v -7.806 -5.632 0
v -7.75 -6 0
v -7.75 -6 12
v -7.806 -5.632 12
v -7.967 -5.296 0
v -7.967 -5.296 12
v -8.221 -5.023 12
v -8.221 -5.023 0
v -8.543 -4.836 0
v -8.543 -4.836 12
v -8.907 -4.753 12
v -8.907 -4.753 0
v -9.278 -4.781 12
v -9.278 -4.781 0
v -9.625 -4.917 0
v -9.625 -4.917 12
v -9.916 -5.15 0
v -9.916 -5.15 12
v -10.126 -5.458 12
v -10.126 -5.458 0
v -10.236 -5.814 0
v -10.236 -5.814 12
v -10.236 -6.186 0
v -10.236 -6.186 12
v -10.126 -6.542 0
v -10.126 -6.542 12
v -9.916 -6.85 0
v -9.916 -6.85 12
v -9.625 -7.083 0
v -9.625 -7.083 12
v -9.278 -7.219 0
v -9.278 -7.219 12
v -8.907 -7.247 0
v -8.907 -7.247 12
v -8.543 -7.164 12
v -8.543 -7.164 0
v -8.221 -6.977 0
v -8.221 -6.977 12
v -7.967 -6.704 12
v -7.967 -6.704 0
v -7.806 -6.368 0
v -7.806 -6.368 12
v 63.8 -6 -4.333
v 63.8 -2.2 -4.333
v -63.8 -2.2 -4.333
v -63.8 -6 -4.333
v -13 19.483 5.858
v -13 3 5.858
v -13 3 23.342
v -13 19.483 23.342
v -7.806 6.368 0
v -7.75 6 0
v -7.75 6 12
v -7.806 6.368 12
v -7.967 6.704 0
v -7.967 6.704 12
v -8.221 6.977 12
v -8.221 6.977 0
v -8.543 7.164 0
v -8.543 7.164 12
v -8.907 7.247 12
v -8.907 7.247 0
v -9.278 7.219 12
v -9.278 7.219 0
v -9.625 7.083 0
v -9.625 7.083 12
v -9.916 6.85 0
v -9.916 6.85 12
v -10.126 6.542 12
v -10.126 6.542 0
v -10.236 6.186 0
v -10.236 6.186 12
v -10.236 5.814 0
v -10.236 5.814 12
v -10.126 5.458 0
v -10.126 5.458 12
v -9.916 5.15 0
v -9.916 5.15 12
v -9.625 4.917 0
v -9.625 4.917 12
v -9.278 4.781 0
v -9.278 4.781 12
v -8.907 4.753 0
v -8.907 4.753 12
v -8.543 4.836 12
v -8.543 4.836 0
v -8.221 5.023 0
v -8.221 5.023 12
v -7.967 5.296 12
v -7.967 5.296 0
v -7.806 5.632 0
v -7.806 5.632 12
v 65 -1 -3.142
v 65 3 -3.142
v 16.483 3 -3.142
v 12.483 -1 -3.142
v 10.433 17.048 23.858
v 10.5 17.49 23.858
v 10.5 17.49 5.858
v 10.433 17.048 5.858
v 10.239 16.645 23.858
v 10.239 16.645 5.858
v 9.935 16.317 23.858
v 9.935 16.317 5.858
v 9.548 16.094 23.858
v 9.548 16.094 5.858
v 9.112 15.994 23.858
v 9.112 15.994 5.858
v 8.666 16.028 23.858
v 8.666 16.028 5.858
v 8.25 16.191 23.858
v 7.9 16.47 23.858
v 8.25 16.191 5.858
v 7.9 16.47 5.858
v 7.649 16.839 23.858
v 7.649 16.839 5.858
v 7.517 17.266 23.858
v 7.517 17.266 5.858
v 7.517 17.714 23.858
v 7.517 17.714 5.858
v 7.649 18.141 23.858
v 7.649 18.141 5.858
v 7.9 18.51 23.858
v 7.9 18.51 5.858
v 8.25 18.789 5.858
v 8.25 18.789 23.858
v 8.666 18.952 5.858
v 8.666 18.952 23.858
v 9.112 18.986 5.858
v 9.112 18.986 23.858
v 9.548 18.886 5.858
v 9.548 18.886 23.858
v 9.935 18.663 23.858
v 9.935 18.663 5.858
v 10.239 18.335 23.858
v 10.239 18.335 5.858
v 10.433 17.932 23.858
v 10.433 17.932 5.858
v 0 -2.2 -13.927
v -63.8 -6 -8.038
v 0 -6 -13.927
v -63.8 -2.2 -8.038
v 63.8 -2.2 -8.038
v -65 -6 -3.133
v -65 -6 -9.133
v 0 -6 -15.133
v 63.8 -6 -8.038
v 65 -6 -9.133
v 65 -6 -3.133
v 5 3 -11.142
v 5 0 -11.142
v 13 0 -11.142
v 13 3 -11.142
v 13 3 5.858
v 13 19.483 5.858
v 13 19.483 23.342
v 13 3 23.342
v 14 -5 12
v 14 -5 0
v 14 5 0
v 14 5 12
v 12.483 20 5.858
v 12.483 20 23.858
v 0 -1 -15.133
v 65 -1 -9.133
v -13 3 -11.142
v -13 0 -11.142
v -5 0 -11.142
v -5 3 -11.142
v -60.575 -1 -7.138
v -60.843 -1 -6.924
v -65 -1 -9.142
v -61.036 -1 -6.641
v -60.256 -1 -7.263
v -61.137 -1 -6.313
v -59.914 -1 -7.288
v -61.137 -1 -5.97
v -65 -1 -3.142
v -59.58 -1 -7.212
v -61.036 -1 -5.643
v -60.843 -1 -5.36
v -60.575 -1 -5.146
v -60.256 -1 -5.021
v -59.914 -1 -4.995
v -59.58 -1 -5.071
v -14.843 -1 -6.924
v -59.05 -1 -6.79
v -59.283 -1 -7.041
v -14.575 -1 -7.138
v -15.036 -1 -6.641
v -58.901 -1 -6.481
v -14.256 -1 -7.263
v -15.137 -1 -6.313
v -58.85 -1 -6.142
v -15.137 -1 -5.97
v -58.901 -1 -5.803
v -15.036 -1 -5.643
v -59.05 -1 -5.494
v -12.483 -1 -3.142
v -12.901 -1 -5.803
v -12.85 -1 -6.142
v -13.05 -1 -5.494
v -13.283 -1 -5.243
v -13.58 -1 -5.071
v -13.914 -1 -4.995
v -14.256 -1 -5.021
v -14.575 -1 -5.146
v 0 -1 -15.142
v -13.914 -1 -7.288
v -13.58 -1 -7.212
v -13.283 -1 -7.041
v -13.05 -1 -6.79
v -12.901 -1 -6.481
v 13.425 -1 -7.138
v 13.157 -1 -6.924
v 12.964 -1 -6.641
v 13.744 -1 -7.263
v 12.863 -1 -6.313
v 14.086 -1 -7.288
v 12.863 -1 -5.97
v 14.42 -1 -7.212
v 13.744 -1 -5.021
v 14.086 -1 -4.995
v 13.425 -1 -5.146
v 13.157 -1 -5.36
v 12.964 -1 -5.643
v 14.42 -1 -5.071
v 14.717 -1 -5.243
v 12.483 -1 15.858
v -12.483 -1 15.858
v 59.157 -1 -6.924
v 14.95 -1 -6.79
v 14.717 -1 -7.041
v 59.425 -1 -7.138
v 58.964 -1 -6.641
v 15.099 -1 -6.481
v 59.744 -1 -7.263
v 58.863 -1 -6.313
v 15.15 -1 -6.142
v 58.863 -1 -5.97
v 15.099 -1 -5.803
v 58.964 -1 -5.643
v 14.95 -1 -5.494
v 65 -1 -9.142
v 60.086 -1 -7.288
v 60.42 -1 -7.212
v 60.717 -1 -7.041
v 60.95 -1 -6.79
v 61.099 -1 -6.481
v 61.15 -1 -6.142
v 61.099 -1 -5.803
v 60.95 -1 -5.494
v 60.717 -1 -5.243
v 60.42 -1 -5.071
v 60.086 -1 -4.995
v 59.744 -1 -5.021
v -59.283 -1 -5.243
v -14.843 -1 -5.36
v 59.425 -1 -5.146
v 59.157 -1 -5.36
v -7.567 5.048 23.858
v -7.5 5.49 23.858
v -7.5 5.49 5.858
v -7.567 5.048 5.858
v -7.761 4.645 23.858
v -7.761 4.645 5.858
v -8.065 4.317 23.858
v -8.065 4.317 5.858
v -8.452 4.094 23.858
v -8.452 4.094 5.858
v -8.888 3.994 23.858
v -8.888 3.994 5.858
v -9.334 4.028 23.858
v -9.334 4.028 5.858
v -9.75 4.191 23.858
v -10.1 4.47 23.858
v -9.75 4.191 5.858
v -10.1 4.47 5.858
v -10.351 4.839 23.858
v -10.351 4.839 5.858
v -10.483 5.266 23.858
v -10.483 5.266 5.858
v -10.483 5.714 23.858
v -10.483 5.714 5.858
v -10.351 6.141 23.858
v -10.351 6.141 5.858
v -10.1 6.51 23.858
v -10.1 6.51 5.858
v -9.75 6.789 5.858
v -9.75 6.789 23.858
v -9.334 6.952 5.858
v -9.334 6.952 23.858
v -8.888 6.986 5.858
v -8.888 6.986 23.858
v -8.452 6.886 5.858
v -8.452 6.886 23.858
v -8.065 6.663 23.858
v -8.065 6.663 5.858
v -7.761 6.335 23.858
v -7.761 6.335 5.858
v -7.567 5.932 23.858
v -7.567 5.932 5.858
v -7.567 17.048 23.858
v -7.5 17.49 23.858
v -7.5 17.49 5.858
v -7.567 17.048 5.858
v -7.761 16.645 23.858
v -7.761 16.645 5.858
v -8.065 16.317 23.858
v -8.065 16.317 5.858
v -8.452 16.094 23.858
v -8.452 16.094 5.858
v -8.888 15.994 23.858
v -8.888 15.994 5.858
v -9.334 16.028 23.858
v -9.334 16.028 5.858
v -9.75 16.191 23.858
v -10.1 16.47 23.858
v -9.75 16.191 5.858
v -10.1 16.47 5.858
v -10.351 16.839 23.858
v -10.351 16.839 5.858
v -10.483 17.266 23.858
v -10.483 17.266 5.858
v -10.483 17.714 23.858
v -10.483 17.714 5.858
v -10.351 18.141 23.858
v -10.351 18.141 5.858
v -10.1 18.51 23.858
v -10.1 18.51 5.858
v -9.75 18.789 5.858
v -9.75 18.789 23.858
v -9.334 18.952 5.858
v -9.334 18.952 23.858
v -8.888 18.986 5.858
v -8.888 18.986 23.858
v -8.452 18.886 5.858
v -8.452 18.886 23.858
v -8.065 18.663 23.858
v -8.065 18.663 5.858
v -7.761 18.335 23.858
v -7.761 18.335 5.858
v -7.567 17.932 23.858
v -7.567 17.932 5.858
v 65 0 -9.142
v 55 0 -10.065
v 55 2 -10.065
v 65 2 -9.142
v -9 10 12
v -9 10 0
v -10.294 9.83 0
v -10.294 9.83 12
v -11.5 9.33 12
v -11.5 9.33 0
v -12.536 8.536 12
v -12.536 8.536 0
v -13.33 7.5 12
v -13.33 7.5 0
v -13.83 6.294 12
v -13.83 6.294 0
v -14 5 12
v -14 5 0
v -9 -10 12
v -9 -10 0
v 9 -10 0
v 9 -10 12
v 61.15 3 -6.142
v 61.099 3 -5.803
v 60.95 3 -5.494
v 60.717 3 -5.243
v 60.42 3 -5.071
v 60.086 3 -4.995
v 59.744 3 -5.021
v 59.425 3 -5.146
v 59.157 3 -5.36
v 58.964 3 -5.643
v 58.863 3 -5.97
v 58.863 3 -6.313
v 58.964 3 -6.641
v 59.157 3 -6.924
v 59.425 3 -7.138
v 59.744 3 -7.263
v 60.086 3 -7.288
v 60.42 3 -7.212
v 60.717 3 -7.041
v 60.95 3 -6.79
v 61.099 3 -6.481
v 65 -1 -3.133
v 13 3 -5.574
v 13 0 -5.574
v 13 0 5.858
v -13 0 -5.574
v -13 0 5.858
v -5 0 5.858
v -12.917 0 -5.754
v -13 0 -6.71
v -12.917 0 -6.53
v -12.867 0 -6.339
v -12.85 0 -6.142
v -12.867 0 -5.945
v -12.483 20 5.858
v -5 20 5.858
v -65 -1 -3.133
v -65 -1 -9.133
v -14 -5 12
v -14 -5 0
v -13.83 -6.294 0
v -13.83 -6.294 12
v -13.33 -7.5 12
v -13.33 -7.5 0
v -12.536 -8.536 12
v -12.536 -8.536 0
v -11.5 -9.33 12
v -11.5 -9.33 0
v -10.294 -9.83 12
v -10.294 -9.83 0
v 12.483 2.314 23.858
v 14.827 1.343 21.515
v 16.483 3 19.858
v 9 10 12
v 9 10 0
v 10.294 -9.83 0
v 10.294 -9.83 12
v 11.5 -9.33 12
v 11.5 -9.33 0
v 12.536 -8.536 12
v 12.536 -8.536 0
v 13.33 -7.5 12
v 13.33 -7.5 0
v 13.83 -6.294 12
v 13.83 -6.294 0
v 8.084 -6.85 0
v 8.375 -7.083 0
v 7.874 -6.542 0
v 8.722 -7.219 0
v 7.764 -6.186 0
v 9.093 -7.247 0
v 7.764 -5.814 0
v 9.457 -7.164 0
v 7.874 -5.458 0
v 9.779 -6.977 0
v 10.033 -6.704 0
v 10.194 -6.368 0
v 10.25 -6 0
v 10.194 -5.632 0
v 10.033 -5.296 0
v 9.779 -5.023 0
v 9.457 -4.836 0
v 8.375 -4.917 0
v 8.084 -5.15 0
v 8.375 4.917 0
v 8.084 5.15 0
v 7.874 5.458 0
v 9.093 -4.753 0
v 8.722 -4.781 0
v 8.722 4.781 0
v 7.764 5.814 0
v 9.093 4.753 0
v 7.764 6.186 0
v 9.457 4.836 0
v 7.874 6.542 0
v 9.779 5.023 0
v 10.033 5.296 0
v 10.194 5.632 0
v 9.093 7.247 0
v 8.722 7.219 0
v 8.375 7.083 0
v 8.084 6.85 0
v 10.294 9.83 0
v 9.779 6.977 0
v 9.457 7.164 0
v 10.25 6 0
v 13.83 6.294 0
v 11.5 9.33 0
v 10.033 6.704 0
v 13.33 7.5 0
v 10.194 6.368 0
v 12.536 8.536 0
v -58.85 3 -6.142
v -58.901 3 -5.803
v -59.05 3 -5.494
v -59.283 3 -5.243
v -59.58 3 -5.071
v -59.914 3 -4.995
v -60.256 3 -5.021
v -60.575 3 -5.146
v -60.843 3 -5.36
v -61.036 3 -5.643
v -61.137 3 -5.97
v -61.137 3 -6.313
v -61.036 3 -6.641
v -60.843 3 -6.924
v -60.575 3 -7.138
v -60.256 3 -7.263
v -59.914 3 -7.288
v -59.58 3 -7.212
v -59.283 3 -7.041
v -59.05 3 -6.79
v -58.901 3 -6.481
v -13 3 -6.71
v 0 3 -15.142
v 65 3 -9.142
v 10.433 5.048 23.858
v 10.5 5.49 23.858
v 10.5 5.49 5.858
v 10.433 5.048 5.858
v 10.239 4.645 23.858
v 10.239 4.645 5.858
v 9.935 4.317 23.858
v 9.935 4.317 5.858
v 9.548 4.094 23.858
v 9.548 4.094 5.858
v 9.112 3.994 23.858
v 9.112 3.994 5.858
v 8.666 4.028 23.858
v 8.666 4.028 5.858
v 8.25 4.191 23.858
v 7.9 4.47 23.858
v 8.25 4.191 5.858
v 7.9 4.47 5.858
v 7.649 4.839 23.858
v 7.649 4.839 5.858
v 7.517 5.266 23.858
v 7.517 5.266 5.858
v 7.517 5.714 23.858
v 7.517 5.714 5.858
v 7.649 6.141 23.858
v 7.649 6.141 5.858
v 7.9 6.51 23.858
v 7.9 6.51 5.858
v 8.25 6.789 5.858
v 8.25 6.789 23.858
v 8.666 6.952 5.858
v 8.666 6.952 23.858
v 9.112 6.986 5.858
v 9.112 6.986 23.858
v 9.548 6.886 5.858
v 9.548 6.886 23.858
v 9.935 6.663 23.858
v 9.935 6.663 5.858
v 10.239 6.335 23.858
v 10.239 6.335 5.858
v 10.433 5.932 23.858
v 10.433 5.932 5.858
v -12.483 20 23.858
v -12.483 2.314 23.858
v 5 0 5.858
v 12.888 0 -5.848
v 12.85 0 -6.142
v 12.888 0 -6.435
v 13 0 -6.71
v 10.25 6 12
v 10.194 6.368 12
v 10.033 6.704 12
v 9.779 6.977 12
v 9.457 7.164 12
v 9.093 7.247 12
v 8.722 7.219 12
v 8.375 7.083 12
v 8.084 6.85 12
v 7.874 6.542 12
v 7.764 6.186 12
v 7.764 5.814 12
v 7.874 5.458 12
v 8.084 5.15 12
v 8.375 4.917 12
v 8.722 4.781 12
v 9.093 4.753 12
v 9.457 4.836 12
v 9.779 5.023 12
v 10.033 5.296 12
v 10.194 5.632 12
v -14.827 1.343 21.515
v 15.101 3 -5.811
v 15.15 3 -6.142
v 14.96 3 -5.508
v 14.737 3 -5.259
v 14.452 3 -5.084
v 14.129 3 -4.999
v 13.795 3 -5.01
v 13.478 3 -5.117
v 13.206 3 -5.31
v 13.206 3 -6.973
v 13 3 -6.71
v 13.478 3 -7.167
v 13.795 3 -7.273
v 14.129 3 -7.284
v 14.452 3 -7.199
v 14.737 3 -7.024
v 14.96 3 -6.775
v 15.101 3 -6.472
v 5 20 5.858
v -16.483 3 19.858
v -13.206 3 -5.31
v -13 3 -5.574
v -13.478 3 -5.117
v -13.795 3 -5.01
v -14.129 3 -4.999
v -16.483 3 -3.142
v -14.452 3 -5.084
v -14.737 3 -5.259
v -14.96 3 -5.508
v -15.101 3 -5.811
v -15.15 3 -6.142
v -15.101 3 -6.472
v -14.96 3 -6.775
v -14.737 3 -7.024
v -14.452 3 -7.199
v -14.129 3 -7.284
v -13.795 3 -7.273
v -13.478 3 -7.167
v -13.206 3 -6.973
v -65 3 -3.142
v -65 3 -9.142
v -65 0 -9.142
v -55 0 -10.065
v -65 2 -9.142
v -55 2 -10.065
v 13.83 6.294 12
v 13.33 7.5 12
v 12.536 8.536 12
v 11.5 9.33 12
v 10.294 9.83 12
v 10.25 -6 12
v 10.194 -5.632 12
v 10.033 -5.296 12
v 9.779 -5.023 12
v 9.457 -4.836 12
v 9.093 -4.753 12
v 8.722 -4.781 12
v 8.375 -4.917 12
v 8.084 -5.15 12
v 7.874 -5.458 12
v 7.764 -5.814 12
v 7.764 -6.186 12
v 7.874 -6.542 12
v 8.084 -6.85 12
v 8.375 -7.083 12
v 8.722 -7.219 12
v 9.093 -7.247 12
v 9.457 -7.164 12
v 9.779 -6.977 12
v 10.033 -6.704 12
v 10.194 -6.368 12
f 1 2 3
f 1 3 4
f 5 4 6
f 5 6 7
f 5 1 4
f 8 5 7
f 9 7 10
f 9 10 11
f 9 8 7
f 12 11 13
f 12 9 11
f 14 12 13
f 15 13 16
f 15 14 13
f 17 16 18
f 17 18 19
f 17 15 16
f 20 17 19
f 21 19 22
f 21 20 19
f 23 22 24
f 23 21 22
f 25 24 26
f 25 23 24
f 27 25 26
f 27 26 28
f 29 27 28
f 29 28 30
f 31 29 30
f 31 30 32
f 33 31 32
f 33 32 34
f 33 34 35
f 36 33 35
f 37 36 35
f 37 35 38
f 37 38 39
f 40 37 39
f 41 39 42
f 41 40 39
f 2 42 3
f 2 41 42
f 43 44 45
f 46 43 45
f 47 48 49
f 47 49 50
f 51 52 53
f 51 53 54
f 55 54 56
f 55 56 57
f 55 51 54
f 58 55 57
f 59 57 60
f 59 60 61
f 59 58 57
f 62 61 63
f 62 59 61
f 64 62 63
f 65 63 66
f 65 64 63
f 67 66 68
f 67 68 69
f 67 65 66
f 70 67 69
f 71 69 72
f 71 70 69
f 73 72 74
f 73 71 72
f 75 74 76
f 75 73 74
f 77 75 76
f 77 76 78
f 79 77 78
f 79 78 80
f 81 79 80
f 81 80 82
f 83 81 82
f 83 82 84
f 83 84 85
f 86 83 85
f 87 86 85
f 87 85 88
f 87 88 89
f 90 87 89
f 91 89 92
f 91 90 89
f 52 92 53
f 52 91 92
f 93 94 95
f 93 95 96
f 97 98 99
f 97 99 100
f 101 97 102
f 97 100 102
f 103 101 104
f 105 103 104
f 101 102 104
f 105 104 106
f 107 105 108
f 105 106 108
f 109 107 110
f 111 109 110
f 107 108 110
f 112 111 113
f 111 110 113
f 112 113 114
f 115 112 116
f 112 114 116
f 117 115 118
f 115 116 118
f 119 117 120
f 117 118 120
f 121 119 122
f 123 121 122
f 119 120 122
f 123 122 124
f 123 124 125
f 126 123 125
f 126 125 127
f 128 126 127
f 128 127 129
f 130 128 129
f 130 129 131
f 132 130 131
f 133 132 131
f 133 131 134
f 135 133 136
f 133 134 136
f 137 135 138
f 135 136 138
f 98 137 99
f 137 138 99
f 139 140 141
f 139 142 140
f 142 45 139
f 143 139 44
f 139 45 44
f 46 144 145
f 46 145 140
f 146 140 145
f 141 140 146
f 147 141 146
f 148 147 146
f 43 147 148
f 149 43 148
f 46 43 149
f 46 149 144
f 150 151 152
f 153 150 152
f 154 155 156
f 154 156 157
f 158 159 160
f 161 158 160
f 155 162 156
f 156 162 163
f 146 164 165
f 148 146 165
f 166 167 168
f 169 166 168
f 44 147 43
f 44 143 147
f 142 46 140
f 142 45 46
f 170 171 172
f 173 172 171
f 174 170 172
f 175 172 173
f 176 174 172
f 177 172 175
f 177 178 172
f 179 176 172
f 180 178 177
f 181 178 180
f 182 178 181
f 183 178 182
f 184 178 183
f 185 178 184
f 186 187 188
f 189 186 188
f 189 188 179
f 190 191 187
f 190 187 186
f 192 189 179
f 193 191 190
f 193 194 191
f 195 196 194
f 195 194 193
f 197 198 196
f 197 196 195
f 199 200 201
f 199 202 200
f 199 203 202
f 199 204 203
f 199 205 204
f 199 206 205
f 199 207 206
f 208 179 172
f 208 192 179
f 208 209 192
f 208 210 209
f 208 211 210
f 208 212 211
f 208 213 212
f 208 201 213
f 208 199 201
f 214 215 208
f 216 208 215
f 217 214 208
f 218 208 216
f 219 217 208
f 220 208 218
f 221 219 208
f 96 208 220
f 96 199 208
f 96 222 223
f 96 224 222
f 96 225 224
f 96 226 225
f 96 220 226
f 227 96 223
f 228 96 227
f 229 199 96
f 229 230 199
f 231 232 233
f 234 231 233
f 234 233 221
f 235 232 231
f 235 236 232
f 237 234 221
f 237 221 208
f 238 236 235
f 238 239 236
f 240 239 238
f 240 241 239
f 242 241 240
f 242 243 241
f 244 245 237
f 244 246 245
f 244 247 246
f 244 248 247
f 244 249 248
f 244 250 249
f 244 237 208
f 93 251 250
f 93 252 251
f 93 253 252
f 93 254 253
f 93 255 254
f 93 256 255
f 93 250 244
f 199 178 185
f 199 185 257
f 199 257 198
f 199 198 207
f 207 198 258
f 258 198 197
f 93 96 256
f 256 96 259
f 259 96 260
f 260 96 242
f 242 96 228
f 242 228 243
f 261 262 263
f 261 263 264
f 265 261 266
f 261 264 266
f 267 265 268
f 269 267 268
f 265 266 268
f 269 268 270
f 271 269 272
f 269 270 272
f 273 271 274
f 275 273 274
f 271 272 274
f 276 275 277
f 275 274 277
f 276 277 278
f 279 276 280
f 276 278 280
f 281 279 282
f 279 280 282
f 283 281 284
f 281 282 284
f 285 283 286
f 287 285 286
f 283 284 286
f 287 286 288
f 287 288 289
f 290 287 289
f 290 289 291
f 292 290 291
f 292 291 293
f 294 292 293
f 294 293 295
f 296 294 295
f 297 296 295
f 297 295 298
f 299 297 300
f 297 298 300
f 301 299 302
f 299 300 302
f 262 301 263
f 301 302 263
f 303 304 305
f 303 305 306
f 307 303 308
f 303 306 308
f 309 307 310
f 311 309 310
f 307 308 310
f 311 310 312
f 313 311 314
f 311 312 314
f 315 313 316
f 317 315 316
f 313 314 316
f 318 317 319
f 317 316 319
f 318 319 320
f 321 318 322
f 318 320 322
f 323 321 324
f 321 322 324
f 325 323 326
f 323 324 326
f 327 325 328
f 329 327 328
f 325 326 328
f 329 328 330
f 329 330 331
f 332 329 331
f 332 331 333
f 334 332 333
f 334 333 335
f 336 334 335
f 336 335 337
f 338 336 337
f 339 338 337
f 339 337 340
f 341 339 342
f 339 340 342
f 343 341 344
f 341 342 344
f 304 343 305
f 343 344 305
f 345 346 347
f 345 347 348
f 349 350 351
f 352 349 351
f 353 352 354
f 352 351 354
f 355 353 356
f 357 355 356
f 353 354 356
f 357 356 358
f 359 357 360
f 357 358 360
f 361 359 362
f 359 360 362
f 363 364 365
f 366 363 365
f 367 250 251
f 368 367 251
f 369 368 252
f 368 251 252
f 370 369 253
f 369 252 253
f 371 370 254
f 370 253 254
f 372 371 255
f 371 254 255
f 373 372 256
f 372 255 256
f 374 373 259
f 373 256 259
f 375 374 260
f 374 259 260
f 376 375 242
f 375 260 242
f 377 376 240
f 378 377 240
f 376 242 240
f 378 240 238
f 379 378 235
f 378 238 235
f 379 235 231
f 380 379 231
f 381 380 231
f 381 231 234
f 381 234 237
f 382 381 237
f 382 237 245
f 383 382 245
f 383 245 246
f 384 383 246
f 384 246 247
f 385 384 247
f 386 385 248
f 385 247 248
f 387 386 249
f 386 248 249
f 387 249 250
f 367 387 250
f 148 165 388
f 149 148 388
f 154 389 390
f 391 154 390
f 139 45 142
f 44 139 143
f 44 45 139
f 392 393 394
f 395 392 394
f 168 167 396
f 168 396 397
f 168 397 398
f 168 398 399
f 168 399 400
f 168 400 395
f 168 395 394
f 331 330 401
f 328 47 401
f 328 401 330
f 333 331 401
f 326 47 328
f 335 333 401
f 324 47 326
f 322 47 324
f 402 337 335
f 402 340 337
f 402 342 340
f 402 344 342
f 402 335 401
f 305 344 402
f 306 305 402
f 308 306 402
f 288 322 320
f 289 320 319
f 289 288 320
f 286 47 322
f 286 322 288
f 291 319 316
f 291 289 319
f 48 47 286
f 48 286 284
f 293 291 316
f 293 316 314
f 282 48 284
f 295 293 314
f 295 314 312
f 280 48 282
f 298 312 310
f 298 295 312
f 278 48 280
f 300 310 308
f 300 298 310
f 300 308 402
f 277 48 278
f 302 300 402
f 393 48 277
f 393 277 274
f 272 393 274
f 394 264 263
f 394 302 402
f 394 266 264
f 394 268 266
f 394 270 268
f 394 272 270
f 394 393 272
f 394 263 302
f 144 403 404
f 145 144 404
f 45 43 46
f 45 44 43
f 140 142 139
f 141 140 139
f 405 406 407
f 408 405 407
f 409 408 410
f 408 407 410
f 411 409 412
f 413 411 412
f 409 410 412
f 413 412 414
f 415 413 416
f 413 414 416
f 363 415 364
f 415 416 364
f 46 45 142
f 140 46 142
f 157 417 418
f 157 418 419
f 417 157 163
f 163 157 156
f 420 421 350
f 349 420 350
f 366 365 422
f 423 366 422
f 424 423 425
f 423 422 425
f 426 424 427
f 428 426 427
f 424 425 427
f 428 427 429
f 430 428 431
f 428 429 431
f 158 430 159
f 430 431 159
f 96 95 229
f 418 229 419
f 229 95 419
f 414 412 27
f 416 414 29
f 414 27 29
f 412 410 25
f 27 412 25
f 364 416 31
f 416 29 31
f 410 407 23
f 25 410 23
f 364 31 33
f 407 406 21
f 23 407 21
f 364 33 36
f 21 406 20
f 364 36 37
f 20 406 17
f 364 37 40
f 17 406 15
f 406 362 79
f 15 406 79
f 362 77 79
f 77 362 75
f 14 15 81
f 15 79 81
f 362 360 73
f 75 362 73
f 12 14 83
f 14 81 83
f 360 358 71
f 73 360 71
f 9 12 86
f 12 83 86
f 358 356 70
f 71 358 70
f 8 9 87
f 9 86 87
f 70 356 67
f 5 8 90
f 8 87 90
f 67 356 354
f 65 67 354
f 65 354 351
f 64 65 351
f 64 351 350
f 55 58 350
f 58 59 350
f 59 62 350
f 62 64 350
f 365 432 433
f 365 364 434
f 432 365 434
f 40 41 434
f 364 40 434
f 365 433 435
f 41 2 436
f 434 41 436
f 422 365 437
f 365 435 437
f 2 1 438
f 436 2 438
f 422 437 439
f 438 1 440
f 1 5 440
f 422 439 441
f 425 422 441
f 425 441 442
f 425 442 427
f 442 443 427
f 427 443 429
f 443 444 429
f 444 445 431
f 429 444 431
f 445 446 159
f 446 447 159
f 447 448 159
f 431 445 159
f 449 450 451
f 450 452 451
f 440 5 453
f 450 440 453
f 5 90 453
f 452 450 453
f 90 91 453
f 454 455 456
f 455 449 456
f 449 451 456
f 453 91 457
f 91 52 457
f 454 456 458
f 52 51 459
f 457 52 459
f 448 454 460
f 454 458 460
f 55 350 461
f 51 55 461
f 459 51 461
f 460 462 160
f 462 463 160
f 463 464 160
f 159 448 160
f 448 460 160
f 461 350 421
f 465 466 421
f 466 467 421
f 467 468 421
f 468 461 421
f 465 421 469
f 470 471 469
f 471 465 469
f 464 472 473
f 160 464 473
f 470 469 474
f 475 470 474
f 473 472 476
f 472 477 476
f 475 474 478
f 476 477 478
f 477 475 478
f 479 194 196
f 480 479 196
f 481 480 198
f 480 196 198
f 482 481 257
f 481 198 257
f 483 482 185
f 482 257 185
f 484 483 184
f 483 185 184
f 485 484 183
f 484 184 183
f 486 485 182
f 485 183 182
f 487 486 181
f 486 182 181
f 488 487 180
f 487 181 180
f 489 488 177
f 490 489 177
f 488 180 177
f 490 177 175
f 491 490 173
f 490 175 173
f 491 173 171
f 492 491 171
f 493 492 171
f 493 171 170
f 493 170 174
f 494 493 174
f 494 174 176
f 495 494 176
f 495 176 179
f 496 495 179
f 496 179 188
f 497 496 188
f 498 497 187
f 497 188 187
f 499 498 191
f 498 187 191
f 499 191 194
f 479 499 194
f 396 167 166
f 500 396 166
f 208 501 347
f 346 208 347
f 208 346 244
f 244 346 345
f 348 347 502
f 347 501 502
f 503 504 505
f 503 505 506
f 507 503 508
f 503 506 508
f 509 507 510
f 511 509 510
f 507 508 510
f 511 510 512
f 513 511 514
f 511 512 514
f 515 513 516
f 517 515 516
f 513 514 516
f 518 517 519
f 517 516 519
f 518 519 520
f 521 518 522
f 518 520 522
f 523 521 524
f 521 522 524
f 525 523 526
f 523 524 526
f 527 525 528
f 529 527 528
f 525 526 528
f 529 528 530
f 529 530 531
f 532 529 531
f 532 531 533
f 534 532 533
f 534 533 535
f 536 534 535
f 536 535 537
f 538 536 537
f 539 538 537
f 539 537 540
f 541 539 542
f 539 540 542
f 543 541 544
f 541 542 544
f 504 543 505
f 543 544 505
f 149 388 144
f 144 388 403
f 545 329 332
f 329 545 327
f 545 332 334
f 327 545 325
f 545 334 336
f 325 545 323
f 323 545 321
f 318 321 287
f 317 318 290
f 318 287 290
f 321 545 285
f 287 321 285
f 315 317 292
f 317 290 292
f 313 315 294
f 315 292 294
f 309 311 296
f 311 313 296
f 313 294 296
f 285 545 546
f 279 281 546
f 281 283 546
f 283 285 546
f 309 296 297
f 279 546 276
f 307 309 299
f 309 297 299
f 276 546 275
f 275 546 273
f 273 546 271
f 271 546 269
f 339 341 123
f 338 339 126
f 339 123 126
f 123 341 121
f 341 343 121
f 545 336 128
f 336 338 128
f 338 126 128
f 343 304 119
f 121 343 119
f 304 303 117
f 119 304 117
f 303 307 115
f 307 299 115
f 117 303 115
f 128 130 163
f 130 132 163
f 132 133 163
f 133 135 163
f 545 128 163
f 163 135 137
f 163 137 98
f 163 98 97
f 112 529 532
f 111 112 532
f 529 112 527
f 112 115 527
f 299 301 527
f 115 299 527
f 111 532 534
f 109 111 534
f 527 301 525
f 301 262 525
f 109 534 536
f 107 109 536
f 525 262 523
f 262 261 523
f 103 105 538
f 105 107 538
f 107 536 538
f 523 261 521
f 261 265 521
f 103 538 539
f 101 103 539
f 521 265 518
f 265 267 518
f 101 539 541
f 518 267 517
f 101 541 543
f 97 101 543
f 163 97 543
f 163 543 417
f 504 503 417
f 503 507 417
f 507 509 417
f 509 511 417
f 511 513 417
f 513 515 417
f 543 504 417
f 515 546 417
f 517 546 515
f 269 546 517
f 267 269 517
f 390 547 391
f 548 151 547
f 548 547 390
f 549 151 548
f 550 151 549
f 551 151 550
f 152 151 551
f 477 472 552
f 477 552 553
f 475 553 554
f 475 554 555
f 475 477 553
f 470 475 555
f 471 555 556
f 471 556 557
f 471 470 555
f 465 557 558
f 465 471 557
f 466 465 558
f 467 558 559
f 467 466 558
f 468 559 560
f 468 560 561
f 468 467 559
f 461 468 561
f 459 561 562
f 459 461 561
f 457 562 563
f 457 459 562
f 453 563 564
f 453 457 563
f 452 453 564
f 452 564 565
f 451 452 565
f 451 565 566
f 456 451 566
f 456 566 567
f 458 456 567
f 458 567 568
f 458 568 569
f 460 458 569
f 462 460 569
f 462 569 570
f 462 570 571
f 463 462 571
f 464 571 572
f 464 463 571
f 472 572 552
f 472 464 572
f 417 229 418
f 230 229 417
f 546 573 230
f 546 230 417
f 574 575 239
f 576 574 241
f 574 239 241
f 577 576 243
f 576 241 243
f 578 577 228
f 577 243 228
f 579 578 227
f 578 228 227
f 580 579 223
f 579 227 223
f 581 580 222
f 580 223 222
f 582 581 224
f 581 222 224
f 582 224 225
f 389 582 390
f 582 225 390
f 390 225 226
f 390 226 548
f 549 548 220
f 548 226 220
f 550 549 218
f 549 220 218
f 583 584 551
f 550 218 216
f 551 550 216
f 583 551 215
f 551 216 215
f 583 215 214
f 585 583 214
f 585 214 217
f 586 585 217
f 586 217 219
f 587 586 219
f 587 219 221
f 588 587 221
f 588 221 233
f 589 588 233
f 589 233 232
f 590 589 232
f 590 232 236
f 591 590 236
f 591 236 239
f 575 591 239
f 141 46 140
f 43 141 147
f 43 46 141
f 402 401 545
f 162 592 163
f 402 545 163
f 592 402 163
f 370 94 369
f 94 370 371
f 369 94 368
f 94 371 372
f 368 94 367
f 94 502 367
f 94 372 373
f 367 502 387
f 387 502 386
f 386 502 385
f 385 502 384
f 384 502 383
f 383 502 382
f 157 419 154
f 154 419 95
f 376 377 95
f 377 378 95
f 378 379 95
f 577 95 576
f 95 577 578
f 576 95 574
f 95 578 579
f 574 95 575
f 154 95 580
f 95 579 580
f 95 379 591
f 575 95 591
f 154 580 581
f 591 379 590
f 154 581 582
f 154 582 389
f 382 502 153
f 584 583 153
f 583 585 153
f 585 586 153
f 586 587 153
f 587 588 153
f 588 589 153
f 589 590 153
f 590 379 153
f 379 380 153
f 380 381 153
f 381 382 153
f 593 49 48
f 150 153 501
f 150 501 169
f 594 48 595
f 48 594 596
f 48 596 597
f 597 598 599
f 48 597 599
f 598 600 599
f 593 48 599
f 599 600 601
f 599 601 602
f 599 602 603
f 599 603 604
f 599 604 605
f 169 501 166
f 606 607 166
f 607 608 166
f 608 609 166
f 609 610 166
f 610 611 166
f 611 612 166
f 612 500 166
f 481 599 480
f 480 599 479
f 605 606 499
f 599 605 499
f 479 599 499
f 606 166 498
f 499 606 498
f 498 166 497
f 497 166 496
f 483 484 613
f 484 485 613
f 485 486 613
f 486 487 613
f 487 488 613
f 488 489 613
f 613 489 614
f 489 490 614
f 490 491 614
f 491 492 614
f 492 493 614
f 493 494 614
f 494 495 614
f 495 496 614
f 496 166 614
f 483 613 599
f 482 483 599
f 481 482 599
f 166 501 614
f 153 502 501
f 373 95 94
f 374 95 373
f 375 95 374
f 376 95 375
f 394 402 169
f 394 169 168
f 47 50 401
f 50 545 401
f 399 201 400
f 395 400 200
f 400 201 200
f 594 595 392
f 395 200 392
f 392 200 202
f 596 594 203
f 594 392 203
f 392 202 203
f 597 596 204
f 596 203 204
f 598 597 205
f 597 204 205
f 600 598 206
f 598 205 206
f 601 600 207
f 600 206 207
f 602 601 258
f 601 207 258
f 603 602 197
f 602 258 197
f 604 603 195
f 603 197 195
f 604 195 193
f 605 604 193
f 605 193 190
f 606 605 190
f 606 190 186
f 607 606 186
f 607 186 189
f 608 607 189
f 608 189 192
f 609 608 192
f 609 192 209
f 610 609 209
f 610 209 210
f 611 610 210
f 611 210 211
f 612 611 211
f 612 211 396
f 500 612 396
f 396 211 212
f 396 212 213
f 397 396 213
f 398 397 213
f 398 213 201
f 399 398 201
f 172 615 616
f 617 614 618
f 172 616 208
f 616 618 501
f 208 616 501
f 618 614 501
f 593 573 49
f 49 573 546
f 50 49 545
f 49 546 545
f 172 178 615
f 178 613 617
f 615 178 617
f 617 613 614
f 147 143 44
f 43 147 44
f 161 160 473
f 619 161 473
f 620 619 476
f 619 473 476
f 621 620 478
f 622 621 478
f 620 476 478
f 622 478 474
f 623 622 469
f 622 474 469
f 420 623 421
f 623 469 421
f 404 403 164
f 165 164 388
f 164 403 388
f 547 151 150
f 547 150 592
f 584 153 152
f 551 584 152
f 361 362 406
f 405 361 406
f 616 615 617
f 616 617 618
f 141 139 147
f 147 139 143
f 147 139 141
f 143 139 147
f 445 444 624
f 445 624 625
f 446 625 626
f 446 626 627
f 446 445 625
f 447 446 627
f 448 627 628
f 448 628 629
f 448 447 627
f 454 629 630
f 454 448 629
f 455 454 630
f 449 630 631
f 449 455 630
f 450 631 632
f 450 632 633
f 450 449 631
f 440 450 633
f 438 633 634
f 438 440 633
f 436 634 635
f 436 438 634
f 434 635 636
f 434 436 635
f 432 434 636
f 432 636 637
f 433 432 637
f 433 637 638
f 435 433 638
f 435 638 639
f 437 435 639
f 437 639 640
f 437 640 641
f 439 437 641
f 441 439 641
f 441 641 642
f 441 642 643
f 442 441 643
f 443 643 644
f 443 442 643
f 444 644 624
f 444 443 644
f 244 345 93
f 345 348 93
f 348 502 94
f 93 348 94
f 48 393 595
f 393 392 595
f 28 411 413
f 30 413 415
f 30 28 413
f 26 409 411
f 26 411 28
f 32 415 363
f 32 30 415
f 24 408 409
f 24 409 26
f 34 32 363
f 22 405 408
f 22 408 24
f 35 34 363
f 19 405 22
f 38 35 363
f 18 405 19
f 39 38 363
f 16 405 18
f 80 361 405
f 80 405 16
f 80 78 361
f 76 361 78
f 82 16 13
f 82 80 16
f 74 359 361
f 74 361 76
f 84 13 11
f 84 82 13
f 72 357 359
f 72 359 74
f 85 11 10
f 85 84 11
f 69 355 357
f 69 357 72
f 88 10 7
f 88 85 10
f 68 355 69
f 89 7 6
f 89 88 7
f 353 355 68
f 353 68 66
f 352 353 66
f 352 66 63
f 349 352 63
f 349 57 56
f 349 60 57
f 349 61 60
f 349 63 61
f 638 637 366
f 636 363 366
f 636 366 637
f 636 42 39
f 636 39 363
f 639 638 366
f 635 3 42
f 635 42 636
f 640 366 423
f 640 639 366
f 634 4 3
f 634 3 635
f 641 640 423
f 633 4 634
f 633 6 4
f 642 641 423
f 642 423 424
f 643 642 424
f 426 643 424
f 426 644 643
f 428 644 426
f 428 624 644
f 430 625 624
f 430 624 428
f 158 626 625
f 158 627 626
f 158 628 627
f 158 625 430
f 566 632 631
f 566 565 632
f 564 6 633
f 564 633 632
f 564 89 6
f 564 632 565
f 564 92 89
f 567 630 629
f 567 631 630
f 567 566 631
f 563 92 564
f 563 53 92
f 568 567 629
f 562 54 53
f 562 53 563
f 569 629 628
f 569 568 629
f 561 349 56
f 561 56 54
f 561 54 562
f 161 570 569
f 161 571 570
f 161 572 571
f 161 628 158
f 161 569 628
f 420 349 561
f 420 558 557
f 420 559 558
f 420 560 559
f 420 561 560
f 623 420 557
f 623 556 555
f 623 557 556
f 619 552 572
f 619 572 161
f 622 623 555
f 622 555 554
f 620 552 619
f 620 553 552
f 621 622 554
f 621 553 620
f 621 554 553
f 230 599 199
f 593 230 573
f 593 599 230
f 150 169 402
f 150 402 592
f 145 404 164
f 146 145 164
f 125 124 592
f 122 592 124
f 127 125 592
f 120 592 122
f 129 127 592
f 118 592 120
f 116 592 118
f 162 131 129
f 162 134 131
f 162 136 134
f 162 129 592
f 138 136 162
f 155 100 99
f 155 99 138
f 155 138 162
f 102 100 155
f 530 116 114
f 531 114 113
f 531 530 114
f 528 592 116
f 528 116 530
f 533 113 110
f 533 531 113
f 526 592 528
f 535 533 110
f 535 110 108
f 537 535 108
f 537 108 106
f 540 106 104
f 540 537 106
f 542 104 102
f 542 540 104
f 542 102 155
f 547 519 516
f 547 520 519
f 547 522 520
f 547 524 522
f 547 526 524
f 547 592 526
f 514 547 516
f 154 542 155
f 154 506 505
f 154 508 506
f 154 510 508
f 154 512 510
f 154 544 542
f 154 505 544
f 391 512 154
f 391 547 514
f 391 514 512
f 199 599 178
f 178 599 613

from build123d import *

# Parameters (mm, degrees)
F0_R         = 1.25
F1_DEPTH     = 12
F2_W         = 34.9669195712
F2_H         = 27
F2_H_2       = 8
F3_DEPTH     = 1
F4_DEPTH     = 20
F5_R         = 1.15
F6_DEPTH     = 3
F7_DEPTH     = 4
F8_DEPTH     = 10
F9_W         = 8
F9_H         = 17
F9_H_2       = 3
F10_DEPTH    = 17
F11_R        = 1.5
F12_DEPTH    = 18
F14_DEPTH    = 5
F15_T        = -1.2
F16_DEPTH    = 3.8
F19_SIZE     = 5
F20_SIZE     = 16.99999
F21_SIZE     = 3
F22_T1_DEPTH = 50.8936235002
F23_DEPTH    = 35


# Not quite as in the source:
# - a fillet or chamfer that OpenCascade refuses, or shapes differently, is made with other operations: its cross-section is extruded or revolved along the edge and cut away or added
# - a fillet or chamfer is up to 0.001 mm smaller than in the source, because OpenCascade refuses the exact size


with BuildPart() as f1:
    # F0 (on Top) → F1 (new body)
    with BuildSketch(Plane.XY):
        with BuildLine():
            ThreePointArc((14, 5), (12.5355339059, 8.5355339059), (9, 10))
            Line((9, 10), (-9, 10))
            ThreePointArc((-9, 10), (-12.5355339059, 8.5355339059), (-14, 5))
            Line((-14, 5), (-14, -5))
            ThreePointArc((-14, -5), (-12.5355339059, -8.5355339059), (-9, -10))
            Line((-9, -10), (9, -10))
            ThreePointArc((9, -10), (12.5355339059, -8.5355339059), (14, -5))
            Line((14, -5), (14, 5))
        make_face()
        with Locations((-9, -6)):
            Circle(F0_R, mode=Mode.SUBTRACT)
        with Locations((9, -6)):
            Circle(F0_R, mode=Mode.SUBTRACT)
        with Locations((-9, 6)):
            Circle(F0_R, mode=Mode.SUBTRACT)
        with Locations((9, 6)):
            Circle(F0_R, mode=Mode.SUBTRACT)
    extrude(amount=F1_DEPTH)


with BuildPart() as f3:
    # F2 (on Front) → F3 (new body)
    with BuildSketch(Plane.XZ):
        Polygon((-17.4834597856, -3.1417060565), (-65, -3.1417060565), (-65, -9.1417060565), (0, -15.1417060565), (65, -9.1417060565), (65, -3.1417060565), (17.4834597856, -3.1417060565), (17.4834597856, -11.1417060565), (-17.4834597856, -11.1417060565), align=None)
        with Locations((0, 10.3582939435)):
            Rectangle(F2_W, F2_H)
        with Locations((0, -7.1417060565)):
            Rectangle(F2_W, F2_H_2)
    extrude(amount=F3_DEPTH)

    # F2 (on Front) → F4 (join)
    with BuildSketch(Plane.XZ):
        with Locations((0, 10.3582939435)):
            Rectangle(F2_W, F2_H)
        with Locations((0, -7.1417060565)):
            Rectangle(F2_W, F2_H_2)
    extrude(amount=-F4_DEPTH)

    # F5 (on face) + F2 (on Front) → F6 (join)
    with BuildSketch(Plane.XZ.offset(1)):
        Polygon((-55, -10.0647829795), (-55, -3.1417060565), (-65, -3.1417060565), (-65, -9.1417060565), align=None)
        with Locations((-60, -6.1417060565)):
            Circle(F5_R, mode=Mode.SUBTRACT)
        Polygon((55, -3.1417060565), (55, -10.0647829795), (65, -9.1417060565), (65, -3.1417060565), align=None)
        with Locations((60, -6.1417060565)):
            Circle(F5_R, mode=Mode.SUBTRACT)
    with BuildSketch(Plane.XZ):
        Polygon((-17.4834597856, -3.1417060565), (-65, -3.1417060565), (-65, -9.1417060565), (0, -15.1417060565), (65, -9.1417060565), (65, -3.1417060565), (17.4834597856, -3.1417060565), (17.4834597856, -11.1417060565), (-17.4834597856, -11.1417060565), align=None)
    extrude(amount=-F6_DEPTH)

    # F5 (on face) → F7 (cut, through all)
    with BuildSketch(Plane.XZ.offset(1)):
        with Locations((-60, -6.1417060565)):
            Circle(F5_R)
        with Locations((60, -6.1417060565)):
            Circle(F5_R)
    extrude(amount=-F7_DEPTH, mode=Mode.SUBTRACT)

    # F5 (on face) → F8 (cut)
    with BuildSketch(Plane.XZ.offset(1)):
        with Locations((-14, -6.1417060565)):
            Circle(F5_R)
        with Locations((14, -6.1417060565)):
            Circle(F5_R)
    extrude(amount=-F8_DEPTH, mode=Mode.SUBTRACT)

    # F9 (on face) → F10 (cut)
    with BuildSketch(Plane(origin=(0, 0, -11.1417060565), x_dir=(1, 0, 0), z_dir=(0, 0, -1))):
        with Locations((9, -11.5)):
            Rectangle(F9_W, F9_H)
        with Locations((9, -1.5)):
            Rectangle(F9_W, F9_H_2)
        with Locations((-9, -11.5)):
            Rectangle(F9_W, F9_H)
        with Locations((-9, -1.5)):
            Rectangle(F9_W, F9_H_2)
    extrude(amount=-F10_DEPTH, mode=Mode.SUBTRACT)

    # F11 (on face) → F12 (cut, through all)
    with BuildSketch(Plane(origin=(0, 0, 5.8582939435), x_dir=(1, 0, 0), z_dir=(0, 0, -1))):
        with Locations((-9, -5.4900380783)):
            Circle(F11_R)
        with Locations((-9, -17.4900380783)):
            Circle(F11_R)
        with Locations((9, -5.4900380783)):
            Circle(F11_R)
        with Locations((9, -17.4900380783)):
            Circle(F11_R)
    extrude(amount=-F12_DEPTH, mode=Mode.SUBTRACT)

    # F19
    f19_edges = [f3.edges().sort_by_distance(p)[0] for p in [
        (-17.48346, -1, 10.358294),
        (17.48346, -1, 10.358294),
        (-17.48346, 20, 6.358294),
        (17.48346, 20, 6.358294),
        (-17.48346, 9.5, 23.858294),
        (17.48346, 9.5, 23.858294),
    ]]
    chamfer(f19_edges, length=F19_SIZE)

    # F20 (size 17 in the source; OpenCascade refuses exactly that, so slightly less here)
    f20_edges = [f3.edges().sort_by_distance(p)[0] for p in [
        (0, 20, -11.141706),
    ]]
    chamfer(f20_edges, length=F20_SIZE)

    # F21
    f21_edges = [f3.edges().sort_by_distance(p)[0] for p in [
        (0, -1, 23.858294),
    ]]
    chamfer(f21_edges, length=F21_SIZE)

    # F22: chamfer of 5 on 1 edges, made by hand

    # F22_s2 → F22_t1 (cut)
    with BuildSketch(Plane.YZ.offset(-25.4468117501)):
        Polygon((-1, 15.8582939435), (2.5355339059, 24.3938278495), (-1, 20.8582939435), align=None)
    extrude(amount=F22_T1_DEPTH, mode=Mode.SUBTRACT)

    # F23 (cut, through all): faces of the model
    f23_faces = [f3.faces().sort_by_distance(p)[0] for p in [
        (15.1081194146, 10.2337090854, -11.1417060565),
        (-15.1081194146, 10.2337090854, -11.1417060565),
    ]]
    extrude(f23_faces, amount=-F23_DEPTH, mode=Mode.SUBTRACT)


with BuildPart() as f14:
    # F13 (on face) → F14 (new body)
    with BuildSketch(Plane.XZ.offset(1)):
        Polygon((65, -2.4325364381), (-65, -2.4325364381), (-65, -8.4325364381), (0, -14.4325364381), (65, -8.4325364381), align=None)
    extrude(amount=F14_DEPTH)

    # F15
    f15_openings = [f14.faces().sort_by_distance(p)[0] for p in [
        (0, -6, -7.099203),
    ]]
    offset(amount=F15_T, openings=f15_openings)


with BuildPart() as f16:
    # F16 (new): a face of the model
    f16_faces = [f14.part.faces().sort_by_distance(p)[0] for p in [
        (0, -2.2, -7.1749809809),
    ]]
    extrude(f16_faces, amount=F16_DEPTH)


with BuildPart() as f14_1:
    # F17: moved
    add(f14.part.moved(Location((0, 0, -0.7))))


with BuildPart() as f16_1:
    # F18: moved
    add(f16.part.moved(Location((0, 0, -0.7))))


solid = Compound([f1.part, f3.part, f14_1.part, f16_1.part])
